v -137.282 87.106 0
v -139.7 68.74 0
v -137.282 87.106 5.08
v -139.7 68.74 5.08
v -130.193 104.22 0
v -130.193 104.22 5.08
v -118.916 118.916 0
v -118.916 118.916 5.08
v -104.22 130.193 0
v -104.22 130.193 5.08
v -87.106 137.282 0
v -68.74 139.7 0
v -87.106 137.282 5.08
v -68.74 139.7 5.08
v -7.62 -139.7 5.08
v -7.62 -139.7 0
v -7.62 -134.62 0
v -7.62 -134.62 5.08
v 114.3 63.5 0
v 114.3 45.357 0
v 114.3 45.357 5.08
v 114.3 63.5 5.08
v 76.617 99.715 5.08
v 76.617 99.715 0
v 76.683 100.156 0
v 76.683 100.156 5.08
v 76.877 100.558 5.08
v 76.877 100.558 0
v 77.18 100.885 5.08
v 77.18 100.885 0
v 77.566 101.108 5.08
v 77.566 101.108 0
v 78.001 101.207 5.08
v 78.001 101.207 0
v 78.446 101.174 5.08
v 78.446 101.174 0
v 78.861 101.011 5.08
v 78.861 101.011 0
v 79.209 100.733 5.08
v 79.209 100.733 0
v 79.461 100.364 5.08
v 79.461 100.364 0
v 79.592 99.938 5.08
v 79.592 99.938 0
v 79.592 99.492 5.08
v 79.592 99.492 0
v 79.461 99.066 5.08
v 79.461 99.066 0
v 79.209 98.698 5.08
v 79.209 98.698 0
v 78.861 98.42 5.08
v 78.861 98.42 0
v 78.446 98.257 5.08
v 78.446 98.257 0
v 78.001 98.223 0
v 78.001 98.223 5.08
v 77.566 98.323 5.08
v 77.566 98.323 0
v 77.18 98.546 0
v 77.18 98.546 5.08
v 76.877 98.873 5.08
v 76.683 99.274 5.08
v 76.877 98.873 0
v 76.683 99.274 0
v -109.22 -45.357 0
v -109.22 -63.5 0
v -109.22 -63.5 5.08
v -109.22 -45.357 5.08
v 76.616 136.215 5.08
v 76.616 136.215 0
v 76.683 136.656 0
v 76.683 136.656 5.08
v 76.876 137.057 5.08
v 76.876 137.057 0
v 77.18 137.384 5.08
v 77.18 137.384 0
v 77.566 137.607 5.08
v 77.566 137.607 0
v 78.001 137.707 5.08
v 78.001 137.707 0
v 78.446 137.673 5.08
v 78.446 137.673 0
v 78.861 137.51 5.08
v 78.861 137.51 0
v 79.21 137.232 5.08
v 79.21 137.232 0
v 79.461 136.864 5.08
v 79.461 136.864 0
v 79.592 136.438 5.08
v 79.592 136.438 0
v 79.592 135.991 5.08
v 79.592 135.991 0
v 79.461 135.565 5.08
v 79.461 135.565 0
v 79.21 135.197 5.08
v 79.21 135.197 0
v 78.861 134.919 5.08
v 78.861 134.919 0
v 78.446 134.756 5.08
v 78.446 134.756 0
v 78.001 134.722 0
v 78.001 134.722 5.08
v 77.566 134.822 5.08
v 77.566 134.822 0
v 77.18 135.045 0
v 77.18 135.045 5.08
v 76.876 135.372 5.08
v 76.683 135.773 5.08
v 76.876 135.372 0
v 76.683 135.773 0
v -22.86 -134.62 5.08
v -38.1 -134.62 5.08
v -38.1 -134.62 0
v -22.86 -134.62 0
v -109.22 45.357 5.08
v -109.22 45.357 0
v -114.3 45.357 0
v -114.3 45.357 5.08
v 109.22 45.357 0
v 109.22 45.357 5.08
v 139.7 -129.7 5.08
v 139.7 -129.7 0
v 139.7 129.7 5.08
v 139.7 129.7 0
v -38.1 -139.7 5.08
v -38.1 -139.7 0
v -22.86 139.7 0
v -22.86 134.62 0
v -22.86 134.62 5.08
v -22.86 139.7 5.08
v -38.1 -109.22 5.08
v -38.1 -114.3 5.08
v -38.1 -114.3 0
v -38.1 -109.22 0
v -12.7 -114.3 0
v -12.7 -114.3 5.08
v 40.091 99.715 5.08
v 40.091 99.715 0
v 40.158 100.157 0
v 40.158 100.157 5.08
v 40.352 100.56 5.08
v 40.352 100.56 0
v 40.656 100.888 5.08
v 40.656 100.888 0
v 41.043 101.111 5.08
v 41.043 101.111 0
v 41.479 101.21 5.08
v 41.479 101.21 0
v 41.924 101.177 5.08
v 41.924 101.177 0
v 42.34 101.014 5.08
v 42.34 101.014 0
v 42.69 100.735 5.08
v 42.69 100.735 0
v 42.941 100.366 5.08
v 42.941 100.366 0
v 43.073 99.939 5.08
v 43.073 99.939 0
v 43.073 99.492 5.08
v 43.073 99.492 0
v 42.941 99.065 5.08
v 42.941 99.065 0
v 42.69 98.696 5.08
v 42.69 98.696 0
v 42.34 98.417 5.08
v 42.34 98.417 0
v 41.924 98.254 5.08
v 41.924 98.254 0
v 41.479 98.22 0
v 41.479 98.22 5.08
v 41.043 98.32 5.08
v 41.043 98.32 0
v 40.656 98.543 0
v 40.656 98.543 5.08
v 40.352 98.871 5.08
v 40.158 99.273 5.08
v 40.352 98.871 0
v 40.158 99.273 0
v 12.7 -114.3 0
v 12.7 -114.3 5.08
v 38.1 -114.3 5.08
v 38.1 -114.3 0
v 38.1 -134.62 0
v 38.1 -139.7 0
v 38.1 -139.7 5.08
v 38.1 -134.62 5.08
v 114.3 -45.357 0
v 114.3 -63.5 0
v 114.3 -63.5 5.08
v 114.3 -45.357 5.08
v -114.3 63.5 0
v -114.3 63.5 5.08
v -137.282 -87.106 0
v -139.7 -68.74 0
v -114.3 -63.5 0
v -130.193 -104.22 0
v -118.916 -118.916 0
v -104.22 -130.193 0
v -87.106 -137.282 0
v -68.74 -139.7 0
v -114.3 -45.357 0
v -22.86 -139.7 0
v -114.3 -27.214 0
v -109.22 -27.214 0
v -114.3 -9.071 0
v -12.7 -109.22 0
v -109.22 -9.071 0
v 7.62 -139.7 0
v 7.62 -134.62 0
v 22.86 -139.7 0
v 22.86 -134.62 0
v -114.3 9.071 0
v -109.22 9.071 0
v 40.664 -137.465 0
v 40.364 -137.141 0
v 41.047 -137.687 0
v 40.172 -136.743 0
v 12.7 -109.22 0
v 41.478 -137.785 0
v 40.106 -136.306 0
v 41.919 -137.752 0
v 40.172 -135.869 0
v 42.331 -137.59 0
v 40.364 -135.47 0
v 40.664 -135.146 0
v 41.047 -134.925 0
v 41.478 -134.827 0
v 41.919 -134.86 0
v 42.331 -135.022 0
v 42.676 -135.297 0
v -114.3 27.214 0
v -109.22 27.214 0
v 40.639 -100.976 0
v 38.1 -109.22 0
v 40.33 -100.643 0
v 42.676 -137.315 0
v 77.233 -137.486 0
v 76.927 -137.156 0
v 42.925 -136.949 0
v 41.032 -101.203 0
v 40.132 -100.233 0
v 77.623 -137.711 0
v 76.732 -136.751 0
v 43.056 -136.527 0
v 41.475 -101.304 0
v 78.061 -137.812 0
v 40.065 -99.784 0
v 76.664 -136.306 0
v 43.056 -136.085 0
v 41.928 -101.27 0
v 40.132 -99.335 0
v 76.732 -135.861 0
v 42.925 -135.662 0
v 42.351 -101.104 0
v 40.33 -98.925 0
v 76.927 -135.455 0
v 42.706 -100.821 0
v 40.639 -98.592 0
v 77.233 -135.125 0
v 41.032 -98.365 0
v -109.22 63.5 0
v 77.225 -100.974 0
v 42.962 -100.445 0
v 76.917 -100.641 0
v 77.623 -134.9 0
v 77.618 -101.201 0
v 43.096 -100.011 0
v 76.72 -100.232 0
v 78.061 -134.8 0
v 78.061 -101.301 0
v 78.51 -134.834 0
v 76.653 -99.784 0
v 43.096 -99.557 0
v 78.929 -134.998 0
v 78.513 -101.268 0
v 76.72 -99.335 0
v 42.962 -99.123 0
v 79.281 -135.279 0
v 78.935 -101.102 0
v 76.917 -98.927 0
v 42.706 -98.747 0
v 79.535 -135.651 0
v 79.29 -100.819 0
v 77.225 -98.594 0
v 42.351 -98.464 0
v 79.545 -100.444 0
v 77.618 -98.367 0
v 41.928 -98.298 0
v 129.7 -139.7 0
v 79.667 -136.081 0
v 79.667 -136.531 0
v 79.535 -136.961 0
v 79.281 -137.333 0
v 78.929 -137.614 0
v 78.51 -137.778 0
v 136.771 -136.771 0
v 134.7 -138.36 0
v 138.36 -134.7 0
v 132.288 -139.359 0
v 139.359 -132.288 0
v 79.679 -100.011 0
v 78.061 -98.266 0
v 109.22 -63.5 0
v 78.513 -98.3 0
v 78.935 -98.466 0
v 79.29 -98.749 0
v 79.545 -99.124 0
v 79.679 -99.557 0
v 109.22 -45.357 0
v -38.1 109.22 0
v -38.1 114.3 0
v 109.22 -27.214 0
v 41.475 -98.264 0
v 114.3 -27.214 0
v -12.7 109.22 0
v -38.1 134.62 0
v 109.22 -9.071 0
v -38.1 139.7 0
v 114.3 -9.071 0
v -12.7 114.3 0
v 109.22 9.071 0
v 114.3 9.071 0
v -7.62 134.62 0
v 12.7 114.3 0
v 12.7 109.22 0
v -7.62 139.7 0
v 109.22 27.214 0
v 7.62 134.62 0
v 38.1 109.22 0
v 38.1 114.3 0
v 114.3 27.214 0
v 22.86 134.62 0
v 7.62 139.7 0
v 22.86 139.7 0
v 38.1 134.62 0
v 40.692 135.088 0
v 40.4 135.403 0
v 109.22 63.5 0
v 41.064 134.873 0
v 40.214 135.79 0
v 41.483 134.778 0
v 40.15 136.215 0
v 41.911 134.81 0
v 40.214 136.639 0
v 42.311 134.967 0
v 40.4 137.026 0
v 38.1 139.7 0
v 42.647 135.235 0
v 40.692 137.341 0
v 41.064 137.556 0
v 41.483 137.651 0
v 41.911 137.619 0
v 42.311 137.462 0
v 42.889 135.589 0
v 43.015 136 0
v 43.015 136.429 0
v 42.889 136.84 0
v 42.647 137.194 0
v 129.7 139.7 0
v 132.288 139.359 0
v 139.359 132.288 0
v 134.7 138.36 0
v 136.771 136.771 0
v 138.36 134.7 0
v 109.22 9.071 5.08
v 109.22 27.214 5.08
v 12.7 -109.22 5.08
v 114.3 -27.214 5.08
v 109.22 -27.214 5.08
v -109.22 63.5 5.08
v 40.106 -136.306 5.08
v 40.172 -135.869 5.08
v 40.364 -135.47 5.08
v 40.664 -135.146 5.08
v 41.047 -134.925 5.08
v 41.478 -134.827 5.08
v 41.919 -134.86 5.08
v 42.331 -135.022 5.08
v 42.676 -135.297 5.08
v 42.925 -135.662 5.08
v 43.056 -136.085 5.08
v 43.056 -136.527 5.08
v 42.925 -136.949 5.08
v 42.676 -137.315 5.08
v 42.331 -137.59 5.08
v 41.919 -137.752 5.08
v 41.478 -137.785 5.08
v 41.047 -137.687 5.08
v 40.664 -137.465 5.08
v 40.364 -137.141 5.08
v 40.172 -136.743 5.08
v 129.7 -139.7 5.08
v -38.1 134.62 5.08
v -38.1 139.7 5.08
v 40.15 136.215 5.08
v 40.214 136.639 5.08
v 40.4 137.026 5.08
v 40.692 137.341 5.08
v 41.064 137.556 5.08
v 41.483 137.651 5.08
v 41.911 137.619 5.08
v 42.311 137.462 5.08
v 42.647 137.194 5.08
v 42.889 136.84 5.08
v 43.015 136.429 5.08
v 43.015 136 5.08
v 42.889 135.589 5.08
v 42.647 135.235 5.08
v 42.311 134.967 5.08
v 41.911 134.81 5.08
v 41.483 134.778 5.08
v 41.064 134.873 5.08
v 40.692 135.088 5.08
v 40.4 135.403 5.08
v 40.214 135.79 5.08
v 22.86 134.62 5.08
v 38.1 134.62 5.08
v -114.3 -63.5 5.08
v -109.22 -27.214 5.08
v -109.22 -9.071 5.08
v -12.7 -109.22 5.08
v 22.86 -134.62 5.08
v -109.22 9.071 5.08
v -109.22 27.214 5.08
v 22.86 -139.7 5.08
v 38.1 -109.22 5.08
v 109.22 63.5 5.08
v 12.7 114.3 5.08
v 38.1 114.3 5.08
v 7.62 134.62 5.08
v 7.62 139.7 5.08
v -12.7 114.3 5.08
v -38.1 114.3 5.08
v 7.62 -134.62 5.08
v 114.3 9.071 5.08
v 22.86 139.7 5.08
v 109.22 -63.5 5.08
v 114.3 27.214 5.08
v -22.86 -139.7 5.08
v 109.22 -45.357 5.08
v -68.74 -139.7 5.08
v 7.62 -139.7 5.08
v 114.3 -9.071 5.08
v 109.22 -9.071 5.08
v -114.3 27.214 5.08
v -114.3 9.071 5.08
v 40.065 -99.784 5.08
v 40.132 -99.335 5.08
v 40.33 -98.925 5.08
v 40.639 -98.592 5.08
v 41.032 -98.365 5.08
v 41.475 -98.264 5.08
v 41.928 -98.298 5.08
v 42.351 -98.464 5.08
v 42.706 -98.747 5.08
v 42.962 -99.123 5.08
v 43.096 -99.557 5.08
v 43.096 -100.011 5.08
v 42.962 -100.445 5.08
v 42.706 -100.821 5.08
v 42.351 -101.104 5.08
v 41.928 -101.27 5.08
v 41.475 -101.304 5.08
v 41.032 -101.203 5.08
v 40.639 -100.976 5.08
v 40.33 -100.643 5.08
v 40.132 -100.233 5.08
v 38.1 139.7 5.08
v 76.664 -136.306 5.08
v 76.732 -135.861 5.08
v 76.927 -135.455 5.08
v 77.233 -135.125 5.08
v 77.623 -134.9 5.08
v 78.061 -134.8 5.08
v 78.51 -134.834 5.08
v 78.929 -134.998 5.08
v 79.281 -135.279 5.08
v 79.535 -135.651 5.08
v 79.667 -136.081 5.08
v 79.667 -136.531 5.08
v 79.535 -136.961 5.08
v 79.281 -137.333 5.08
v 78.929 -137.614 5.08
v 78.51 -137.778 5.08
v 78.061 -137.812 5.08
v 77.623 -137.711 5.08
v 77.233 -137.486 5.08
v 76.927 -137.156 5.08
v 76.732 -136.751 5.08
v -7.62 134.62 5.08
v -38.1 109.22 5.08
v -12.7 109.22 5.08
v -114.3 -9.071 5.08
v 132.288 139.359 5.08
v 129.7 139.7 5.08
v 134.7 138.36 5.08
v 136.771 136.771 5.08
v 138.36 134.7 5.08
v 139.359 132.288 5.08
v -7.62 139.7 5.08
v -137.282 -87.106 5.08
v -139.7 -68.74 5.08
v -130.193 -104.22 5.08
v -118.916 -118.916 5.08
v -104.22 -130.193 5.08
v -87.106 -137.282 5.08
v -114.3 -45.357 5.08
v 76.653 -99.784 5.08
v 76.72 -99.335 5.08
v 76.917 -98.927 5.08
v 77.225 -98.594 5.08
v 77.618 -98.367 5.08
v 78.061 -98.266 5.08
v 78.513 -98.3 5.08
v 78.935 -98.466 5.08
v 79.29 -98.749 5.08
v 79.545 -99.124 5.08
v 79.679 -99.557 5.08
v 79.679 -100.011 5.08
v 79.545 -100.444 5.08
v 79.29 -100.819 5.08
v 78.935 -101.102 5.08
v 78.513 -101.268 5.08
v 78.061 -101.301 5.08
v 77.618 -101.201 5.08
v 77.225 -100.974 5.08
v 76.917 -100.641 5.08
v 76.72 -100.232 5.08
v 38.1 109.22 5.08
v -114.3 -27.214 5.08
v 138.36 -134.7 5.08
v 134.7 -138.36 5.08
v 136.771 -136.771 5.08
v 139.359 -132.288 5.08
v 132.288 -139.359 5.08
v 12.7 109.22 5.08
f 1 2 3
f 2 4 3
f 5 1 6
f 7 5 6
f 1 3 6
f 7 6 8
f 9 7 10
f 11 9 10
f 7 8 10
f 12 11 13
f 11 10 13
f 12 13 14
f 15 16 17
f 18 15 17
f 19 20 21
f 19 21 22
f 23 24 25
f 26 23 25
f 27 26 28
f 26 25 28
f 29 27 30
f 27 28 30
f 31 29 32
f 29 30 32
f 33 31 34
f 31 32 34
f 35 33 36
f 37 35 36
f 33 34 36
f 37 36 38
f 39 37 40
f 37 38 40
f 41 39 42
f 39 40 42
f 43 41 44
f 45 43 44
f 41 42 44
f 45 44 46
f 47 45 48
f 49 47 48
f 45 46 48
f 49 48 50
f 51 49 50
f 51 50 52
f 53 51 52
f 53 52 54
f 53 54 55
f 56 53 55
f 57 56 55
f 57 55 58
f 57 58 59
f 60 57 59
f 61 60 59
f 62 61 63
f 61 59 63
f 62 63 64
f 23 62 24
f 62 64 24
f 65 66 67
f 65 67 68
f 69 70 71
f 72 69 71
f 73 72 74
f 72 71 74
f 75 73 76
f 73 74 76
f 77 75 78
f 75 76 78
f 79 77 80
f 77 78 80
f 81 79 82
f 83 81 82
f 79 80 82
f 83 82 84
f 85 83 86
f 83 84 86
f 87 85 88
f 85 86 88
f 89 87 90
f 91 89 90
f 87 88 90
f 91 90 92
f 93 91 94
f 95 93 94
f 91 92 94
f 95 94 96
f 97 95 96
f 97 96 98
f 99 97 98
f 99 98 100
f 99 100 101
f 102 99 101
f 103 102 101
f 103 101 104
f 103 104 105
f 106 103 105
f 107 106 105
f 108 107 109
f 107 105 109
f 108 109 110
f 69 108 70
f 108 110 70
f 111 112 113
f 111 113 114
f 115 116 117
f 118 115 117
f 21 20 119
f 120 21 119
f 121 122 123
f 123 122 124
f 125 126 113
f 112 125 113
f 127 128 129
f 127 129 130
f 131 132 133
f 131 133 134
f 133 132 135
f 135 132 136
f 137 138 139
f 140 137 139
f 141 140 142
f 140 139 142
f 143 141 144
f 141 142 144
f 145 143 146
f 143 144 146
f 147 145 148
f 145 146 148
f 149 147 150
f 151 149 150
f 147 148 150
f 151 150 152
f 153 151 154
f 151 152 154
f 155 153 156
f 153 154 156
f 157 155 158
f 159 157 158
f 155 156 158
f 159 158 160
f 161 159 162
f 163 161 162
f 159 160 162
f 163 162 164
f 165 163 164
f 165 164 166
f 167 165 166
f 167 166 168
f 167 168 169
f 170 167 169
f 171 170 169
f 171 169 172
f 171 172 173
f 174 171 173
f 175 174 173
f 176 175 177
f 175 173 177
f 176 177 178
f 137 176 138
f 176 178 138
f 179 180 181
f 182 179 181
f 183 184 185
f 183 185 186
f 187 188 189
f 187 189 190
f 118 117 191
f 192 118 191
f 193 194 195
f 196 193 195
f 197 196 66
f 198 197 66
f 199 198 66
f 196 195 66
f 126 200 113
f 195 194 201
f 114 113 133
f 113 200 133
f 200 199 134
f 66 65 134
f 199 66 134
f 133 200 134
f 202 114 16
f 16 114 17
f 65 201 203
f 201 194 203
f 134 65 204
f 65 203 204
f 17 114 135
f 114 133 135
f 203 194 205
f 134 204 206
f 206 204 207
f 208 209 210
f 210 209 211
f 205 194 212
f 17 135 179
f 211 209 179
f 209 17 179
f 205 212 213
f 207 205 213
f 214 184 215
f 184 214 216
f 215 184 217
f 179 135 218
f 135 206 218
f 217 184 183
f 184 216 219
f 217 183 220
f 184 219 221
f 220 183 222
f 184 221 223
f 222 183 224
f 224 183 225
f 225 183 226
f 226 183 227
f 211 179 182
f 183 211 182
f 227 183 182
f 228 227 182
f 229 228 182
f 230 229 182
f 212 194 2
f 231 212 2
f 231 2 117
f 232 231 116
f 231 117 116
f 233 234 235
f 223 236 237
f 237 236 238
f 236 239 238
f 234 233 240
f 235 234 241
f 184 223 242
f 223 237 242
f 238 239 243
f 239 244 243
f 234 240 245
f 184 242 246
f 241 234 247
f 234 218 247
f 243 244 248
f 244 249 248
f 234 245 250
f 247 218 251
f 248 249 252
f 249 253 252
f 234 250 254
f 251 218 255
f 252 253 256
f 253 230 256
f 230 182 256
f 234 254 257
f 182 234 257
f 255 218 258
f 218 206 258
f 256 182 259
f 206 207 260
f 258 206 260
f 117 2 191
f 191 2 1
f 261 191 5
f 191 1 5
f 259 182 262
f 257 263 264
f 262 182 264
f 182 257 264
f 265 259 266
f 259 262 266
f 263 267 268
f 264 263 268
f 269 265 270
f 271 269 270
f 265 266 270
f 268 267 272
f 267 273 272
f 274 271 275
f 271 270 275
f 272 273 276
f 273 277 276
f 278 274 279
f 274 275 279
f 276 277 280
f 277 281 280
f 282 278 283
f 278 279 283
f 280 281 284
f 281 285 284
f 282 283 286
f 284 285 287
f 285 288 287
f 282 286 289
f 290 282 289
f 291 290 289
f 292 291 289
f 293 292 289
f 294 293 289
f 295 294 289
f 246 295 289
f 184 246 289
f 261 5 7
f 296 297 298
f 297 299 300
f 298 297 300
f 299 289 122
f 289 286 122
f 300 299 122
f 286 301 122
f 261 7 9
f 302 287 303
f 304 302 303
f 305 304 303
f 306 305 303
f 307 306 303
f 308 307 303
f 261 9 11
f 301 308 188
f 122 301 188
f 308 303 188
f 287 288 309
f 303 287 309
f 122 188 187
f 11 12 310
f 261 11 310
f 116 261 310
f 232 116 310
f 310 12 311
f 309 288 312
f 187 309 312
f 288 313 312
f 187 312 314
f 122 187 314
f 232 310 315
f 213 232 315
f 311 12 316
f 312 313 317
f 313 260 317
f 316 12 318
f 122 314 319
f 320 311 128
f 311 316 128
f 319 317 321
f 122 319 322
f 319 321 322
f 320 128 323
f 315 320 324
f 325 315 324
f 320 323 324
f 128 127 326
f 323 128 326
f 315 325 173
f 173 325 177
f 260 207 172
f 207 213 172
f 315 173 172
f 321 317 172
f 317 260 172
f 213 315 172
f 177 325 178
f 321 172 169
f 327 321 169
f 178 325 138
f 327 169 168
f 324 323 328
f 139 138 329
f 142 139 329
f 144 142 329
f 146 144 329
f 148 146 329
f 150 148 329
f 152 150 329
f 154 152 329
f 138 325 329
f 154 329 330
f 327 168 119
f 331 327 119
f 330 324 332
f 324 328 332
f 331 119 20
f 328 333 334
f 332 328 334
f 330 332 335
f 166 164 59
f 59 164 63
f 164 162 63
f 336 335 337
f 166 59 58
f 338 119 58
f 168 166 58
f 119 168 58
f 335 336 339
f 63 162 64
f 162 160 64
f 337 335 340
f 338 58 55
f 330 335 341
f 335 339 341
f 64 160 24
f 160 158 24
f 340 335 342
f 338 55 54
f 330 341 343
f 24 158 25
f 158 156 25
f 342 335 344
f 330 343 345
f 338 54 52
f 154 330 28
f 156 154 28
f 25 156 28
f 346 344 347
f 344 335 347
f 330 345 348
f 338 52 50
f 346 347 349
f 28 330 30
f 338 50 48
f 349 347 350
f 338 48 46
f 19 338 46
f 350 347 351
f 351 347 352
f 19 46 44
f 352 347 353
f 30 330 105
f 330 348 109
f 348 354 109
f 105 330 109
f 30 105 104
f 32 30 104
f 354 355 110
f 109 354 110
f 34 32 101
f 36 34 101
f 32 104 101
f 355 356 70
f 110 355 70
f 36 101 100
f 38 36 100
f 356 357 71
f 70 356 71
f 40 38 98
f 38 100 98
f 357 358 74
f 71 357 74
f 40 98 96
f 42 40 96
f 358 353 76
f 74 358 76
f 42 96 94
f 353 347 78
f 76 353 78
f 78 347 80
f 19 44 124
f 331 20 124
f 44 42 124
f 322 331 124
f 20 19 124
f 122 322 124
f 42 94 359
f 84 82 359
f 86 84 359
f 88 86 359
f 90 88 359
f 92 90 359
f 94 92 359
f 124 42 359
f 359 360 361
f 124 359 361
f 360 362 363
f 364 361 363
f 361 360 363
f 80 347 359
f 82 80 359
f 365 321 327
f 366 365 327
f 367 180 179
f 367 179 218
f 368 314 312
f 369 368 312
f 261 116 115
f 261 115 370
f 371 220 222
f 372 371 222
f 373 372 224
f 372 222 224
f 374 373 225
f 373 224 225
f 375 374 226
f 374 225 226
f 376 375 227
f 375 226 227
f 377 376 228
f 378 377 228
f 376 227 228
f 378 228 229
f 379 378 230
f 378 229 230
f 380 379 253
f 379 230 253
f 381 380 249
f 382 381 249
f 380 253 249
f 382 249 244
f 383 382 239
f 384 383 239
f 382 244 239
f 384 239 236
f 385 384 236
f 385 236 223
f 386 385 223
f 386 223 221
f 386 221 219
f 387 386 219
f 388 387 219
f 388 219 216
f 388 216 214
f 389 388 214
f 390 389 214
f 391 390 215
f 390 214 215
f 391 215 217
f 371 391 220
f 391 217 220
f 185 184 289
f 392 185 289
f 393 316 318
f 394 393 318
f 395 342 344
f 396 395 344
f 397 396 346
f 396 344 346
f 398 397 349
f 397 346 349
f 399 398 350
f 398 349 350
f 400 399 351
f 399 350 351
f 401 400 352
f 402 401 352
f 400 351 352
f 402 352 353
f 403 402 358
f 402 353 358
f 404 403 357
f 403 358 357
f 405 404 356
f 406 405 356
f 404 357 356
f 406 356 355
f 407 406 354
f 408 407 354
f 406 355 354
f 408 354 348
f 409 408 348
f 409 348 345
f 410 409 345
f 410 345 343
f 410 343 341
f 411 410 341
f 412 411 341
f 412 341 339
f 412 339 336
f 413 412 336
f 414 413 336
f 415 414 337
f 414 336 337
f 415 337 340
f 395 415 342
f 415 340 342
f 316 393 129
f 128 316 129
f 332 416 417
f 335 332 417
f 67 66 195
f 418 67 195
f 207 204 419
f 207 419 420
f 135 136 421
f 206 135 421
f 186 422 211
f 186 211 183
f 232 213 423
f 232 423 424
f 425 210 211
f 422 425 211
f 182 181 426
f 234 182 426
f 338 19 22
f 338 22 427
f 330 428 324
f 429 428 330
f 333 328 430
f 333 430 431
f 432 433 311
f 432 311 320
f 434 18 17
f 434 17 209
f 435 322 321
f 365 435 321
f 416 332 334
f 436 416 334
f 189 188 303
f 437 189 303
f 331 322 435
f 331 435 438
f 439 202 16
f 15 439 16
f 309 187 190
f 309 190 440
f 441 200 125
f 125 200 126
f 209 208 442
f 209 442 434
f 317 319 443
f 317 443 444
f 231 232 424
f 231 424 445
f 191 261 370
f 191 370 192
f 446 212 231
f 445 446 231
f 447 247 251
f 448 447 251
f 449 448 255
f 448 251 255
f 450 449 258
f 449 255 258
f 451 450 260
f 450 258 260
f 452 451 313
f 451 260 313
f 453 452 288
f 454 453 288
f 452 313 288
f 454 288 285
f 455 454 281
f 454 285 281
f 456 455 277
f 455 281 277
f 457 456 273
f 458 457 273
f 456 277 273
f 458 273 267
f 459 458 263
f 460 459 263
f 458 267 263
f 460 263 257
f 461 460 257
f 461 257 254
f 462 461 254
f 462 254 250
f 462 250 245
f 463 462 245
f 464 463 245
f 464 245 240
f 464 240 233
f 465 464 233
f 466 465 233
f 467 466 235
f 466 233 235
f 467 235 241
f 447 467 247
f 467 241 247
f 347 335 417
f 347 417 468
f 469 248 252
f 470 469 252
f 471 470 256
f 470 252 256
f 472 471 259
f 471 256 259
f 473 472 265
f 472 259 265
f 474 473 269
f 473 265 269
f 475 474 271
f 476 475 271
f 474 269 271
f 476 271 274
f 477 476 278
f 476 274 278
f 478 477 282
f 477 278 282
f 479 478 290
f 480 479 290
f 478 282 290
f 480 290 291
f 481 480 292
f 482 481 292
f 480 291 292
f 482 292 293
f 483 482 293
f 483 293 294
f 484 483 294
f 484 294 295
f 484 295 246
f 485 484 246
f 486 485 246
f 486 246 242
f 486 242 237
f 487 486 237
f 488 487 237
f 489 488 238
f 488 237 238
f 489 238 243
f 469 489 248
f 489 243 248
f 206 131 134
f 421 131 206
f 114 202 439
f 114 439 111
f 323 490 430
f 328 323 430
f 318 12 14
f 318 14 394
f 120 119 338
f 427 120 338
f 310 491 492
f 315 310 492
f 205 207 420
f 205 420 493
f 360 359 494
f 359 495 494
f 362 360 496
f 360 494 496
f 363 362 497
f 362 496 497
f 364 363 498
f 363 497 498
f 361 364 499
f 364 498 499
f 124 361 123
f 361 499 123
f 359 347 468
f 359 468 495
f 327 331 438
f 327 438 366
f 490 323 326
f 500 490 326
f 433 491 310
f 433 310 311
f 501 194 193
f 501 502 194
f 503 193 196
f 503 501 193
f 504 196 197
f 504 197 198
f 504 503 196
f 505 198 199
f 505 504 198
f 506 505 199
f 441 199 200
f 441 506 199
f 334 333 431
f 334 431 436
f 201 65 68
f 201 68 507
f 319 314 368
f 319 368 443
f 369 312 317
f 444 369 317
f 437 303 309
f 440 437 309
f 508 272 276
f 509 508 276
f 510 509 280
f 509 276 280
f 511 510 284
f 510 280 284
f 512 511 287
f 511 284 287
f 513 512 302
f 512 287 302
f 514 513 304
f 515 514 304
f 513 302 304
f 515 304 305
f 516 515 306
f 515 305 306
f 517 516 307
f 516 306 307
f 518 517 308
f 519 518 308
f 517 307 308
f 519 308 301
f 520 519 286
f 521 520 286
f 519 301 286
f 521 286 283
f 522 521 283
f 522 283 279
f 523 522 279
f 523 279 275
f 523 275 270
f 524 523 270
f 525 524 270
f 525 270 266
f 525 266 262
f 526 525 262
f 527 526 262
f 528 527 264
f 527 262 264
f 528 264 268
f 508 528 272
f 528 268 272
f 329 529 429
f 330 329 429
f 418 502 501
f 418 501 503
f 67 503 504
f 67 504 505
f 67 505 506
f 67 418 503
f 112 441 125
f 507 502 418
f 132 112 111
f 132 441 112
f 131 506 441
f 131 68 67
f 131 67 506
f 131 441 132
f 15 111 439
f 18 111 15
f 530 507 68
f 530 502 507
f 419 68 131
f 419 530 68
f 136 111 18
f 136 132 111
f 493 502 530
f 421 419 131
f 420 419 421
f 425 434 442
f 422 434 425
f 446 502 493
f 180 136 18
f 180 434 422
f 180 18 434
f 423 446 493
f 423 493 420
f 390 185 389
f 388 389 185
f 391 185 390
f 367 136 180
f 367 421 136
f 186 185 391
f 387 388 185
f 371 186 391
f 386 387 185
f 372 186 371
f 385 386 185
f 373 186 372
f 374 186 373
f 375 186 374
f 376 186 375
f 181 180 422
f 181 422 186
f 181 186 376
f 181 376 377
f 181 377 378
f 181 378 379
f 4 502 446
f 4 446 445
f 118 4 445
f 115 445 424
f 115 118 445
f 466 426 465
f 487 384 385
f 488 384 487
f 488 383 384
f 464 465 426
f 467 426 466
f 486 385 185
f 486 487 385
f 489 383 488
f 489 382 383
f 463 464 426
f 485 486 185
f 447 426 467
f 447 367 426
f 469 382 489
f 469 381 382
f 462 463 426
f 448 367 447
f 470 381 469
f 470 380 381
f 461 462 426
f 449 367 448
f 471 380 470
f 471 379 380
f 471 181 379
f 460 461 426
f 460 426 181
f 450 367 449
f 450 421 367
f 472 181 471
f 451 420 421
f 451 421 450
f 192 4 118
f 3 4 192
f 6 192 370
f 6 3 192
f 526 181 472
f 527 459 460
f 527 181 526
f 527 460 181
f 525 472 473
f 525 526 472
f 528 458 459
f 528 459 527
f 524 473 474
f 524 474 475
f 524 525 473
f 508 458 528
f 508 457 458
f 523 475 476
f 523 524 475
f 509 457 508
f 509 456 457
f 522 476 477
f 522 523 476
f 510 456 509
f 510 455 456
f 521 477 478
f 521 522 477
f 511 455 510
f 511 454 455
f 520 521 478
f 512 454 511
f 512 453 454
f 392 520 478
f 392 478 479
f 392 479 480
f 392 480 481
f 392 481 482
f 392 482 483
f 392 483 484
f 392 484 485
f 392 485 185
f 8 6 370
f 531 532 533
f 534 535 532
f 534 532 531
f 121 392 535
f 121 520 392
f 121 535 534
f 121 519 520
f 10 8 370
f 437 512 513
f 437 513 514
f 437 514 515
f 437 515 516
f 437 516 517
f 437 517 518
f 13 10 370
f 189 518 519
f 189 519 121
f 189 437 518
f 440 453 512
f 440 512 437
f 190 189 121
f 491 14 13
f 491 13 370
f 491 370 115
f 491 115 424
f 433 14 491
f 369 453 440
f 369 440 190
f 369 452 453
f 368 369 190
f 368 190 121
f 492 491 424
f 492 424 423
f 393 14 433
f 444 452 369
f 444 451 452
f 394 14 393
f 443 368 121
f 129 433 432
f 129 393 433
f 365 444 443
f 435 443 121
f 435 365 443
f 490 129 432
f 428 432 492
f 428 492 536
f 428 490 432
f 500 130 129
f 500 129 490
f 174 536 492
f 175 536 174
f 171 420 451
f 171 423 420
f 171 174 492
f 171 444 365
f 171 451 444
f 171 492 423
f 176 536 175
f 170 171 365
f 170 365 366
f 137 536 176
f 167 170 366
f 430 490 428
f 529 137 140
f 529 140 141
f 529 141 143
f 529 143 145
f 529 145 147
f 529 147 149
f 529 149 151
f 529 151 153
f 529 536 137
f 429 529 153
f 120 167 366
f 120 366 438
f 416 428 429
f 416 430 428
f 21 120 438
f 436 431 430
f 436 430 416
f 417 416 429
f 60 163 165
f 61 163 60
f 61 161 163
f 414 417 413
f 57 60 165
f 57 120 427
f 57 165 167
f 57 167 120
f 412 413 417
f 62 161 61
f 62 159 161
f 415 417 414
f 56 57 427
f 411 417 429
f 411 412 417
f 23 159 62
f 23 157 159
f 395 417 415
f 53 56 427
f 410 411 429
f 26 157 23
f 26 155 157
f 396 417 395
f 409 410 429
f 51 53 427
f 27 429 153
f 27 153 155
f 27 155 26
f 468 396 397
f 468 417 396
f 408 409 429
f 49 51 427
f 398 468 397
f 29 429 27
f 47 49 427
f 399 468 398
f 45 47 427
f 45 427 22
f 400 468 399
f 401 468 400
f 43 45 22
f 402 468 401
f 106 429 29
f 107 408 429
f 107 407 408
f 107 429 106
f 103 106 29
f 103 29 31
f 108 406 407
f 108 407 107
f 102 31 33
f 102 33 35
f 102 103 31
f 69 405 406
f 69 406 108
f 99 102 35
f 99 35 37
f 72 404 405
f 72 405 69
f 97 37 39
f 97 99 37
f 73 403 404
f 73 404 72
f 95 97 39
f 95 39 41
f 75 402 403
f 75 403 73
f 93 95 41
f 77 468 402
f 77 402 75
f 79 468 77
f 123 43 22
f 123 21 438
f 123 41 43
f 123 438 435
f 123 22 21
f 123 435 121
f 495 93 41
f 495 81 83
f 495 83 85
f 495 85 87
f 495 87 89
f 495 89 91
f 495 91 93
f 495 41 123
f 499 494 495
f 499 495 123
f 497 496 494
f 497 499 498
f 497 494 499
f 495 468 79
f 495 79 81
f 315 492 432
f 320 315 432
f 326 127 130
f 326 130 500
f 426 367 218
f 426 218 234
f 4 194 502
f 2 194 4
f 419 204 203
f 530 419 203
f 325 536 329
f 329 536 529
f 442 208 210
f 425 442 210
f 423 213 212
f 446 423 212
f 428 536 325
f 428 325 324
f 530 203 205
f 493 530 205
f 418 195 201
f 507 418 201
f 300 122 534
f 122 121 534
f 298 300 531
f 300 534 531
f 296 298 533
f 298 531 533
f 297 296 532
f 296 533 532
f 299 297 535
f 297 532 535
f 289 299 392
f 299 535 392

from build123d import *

# Parameters (mm, degrees)
SKETCH1_W           = 279.4
SKETCH1_H           = 279.4
BOSS_EXTRUDE1_DEPTH = 5.08
FILLET1_R           = 70.96
FILLET2_R           = 70.960000066
FILLET3_R           = 10
FILLET4_R           = 10
SKETCH2_W           = 25.4
SKETCH2_H           = 5.08
CUT_EXTRUDE1_DEPTH  = 7.62
SKETCH3_W           = 15.24
SKETCH3_H           = 5.08
CUT_EXTRUDE2_DEPTH  = 5.08
SKETCH4_W           = 25.4
SKETCH4_H           = 5.08
SKETCH4_W_2         = 15.24
CUT_EXTRUDE3_DEPTH  = 5.08
SKETCH5_W           = 5.08
SKETCH5_H           = 18.142857143
CUT_EXTRUDE4_DEPTH  = 5.08
SKETCH9_R           = 1.521747373
SKETCH9_R_2         = 1.52437788
SKETCH9_R_3         = 1.483080804
SKETCH9_R_4         = 1.509853377
CUT_EXTRUDE5_DEPTH  = 5.08
SKETCH10_R          = 1.496375704
SKETCH10_R_2        = 1.496038234
SKETCH10_R_3        = 1.499292219
SKETCH10_R_4        = 1.440705467
CUT_EXTRUDE6_DEPTH  = 5.08


with BuildPart() as part:
    # Sketch1 → Boss-Extrude1 (new body)
    with BuildSketch(Plane.XY):
        Rectangle(SKETCH1_W, SKETCH1_H)
    extrude(amount=BOSS_EXTRUDE1_DEPTH)

    # Fillet1
    fillet1_edges = [part.edges().sort_by_distance(p)[0] for p in [
        (-139.7, 139.7, 2.54),
    ]]
    fillet(fillet1_edges, radius=FILLET1_R)

    # Fillet2
    fillet2_edges = [part.edges().sort_by_distance(p)[0] for p in [
        (-139.7, -139.7, 2.54),
    ]]
    fillet(fillet2_edges, radius=FILLET2_R)

    # Fillet3
    fillet3_edges = [part.edges().sort_by_distance(p)[0] for p in [
        (139.7, 139.7, 2.54),
    ]]
    fillet(fillet3_edges, radius=FILLET3_R)

    # Fillet4
    fillet4_edges = [part.edges().sort_by_distance(p)[0] for p in [
        (139.7, -139.7, 2.54),
    ]]
    fillet(fillet4_edges, radius=FILLET4_R)

    # Sketch2 → Cut-Extrude1 (cut)
    with BuildSketch(Plane.XY.offset(5.08)):
        with Locations((-25.4, -111.76)):
            Rectangle(SKETCH2_W, SKETCH2_H)
        with Locations((25.4, -111.76)):
            Rectangle(SKETCH2_W, SKETCH2_H)
    extrude(amount=-CUT_EXTRUDE1_DEPTH, mode=Mode.SUBTRACT)

    # Sketch3 → Cut-Extrude2 (cut)
    with BuildSketch(Plane.XY.offset(5.08)):
        with Locations((-30.48, -137.16)):
            Rectangle(SKETCH3_W, SKETCH3_H)
        with Locations((0, -137.16)):
            Rectangle(SKETCH3_W, SKETCH3_H)
        with Locations((30.48, -137.16)):
            Rectangle(SKETCH3_W, SKETCH3_H)
    extrude(amount=-CUT_EXTRUDE2_DEPTH, mode=Mode.SUBTRACT)

    # Sketch4 → Cut-Extrude3 (cut)
    with BuildSketch(Plane.XY.offset(5.08)):
        with Locations((-25.4, 111.76)):
            Rectangle(SKETCH4_W, SKETCH4_H)
        with Locations((25.4, 111.76)):
            Rectangle(SKETCH4_W, SKETCH4_H)
        with Locations((-30.48, 137.16)):
            Rectangle(SKETCH4_W_2, SKETCH4_H)
        with Locations((0, 137.16)):
            Rectangle(SKETCH4_W_2, SKETCH4_H)
        with Locations((30.48, 137.16)):
            Rectangle(SKETCH4_W_2, SKETCH4_H)
    extrude(amount=-CUT_EXTRUDE3_DEPTH, mode=Mode.SUBTRACT)

    # Sketch5 → Cut-Extrude4 (cut)
    with BuildSketch(Plane(origin=(0, 0, 0), x_dir=(-1, 0, 0), z_dir=(0, 0, -1))):
        with Locations((111.76, -54.428571429)):
            Rectangle(SKETCH5_W, SKETCH5_H)
        with Locations((111.76, -18.142857143)):
            Rectangle(SKETCH5_W, SKETCH5_H)
        with Locations((111.76, 18.142857143)):
            Rectangle(SKETCH5_W, SKETCH5_H)
        with Locations((111.76, 54.428571429)):
            Rectangle(SKETCH5_W, SKETCH5_H)
        with Locations((-111.76, -54.428571429)):
            Rectangle(SKETCH5_W, SKETCH5_H)
        with Locations((-111.76, -18.142857143)):
            Rectangle(SKETCH5_W, SKETCH5_H)
        with Locations((-111.76, 18.142857143)):
            Rectangle(SKETCH5_W, SKETCH5_H)
        with Locations((-111.76, 54.428571429)):
            Rectangle(SKETCH5_W, SKETCH5_H)
    extrude(amount=-CUT_EXTRUDE4_DEPTH, mode=Mode.SUBTRACT)

    # Sketch9 → Cut-Extrude5 (cut)
    with BuildSketch(Plane(origin=(0, 0, 0), x_dir=(-1, 0, 0), z_dir=(0, 0, -1))):
        with Locations((-78.174292247, -99.783948619)):
            Circle(SKETCH9_R)
        with Locations((-41.5890041, -99.783948619)):
            Circle(SKETCH9_R_2)
        with Locations((-41.5890041, -136.30594042)):
            Circle(SKETCH9_R_3)
        with Locations((-78.174292247, -136.30594042)):
            Circle(SKETCH9_R_4)
    extrude(amount=-CUT_EXTRUDE5_DEPTH, mode=Mode.SUBTRACT)

    # Sketch10 → Cut-Extrude6 (cut)
    with BuildSketch(Plane(origin=(0, 0, 0), x_dir=(-1, 0, 0), z_dir=(0, 0, -1))):
        with Locations((-78.112727159, 136.214508439)):
            Circle(SKETCH10_R)
        with Locations((-78.112727159, 99.715329187)):
            Circle(SKETCH10_R_2)
        with Locations((-41.590577287, 99.715329187)):
            Circle(SKETCH10_R_3)
        with Locations((-41.590577287, 136.214508439)):
            Circle(SKETCH10_R_4)
    extrude(amount=-CUT_EXTRUDE6_DEPTH, mode=Mode.SUBTRACT)


solid = part.part
